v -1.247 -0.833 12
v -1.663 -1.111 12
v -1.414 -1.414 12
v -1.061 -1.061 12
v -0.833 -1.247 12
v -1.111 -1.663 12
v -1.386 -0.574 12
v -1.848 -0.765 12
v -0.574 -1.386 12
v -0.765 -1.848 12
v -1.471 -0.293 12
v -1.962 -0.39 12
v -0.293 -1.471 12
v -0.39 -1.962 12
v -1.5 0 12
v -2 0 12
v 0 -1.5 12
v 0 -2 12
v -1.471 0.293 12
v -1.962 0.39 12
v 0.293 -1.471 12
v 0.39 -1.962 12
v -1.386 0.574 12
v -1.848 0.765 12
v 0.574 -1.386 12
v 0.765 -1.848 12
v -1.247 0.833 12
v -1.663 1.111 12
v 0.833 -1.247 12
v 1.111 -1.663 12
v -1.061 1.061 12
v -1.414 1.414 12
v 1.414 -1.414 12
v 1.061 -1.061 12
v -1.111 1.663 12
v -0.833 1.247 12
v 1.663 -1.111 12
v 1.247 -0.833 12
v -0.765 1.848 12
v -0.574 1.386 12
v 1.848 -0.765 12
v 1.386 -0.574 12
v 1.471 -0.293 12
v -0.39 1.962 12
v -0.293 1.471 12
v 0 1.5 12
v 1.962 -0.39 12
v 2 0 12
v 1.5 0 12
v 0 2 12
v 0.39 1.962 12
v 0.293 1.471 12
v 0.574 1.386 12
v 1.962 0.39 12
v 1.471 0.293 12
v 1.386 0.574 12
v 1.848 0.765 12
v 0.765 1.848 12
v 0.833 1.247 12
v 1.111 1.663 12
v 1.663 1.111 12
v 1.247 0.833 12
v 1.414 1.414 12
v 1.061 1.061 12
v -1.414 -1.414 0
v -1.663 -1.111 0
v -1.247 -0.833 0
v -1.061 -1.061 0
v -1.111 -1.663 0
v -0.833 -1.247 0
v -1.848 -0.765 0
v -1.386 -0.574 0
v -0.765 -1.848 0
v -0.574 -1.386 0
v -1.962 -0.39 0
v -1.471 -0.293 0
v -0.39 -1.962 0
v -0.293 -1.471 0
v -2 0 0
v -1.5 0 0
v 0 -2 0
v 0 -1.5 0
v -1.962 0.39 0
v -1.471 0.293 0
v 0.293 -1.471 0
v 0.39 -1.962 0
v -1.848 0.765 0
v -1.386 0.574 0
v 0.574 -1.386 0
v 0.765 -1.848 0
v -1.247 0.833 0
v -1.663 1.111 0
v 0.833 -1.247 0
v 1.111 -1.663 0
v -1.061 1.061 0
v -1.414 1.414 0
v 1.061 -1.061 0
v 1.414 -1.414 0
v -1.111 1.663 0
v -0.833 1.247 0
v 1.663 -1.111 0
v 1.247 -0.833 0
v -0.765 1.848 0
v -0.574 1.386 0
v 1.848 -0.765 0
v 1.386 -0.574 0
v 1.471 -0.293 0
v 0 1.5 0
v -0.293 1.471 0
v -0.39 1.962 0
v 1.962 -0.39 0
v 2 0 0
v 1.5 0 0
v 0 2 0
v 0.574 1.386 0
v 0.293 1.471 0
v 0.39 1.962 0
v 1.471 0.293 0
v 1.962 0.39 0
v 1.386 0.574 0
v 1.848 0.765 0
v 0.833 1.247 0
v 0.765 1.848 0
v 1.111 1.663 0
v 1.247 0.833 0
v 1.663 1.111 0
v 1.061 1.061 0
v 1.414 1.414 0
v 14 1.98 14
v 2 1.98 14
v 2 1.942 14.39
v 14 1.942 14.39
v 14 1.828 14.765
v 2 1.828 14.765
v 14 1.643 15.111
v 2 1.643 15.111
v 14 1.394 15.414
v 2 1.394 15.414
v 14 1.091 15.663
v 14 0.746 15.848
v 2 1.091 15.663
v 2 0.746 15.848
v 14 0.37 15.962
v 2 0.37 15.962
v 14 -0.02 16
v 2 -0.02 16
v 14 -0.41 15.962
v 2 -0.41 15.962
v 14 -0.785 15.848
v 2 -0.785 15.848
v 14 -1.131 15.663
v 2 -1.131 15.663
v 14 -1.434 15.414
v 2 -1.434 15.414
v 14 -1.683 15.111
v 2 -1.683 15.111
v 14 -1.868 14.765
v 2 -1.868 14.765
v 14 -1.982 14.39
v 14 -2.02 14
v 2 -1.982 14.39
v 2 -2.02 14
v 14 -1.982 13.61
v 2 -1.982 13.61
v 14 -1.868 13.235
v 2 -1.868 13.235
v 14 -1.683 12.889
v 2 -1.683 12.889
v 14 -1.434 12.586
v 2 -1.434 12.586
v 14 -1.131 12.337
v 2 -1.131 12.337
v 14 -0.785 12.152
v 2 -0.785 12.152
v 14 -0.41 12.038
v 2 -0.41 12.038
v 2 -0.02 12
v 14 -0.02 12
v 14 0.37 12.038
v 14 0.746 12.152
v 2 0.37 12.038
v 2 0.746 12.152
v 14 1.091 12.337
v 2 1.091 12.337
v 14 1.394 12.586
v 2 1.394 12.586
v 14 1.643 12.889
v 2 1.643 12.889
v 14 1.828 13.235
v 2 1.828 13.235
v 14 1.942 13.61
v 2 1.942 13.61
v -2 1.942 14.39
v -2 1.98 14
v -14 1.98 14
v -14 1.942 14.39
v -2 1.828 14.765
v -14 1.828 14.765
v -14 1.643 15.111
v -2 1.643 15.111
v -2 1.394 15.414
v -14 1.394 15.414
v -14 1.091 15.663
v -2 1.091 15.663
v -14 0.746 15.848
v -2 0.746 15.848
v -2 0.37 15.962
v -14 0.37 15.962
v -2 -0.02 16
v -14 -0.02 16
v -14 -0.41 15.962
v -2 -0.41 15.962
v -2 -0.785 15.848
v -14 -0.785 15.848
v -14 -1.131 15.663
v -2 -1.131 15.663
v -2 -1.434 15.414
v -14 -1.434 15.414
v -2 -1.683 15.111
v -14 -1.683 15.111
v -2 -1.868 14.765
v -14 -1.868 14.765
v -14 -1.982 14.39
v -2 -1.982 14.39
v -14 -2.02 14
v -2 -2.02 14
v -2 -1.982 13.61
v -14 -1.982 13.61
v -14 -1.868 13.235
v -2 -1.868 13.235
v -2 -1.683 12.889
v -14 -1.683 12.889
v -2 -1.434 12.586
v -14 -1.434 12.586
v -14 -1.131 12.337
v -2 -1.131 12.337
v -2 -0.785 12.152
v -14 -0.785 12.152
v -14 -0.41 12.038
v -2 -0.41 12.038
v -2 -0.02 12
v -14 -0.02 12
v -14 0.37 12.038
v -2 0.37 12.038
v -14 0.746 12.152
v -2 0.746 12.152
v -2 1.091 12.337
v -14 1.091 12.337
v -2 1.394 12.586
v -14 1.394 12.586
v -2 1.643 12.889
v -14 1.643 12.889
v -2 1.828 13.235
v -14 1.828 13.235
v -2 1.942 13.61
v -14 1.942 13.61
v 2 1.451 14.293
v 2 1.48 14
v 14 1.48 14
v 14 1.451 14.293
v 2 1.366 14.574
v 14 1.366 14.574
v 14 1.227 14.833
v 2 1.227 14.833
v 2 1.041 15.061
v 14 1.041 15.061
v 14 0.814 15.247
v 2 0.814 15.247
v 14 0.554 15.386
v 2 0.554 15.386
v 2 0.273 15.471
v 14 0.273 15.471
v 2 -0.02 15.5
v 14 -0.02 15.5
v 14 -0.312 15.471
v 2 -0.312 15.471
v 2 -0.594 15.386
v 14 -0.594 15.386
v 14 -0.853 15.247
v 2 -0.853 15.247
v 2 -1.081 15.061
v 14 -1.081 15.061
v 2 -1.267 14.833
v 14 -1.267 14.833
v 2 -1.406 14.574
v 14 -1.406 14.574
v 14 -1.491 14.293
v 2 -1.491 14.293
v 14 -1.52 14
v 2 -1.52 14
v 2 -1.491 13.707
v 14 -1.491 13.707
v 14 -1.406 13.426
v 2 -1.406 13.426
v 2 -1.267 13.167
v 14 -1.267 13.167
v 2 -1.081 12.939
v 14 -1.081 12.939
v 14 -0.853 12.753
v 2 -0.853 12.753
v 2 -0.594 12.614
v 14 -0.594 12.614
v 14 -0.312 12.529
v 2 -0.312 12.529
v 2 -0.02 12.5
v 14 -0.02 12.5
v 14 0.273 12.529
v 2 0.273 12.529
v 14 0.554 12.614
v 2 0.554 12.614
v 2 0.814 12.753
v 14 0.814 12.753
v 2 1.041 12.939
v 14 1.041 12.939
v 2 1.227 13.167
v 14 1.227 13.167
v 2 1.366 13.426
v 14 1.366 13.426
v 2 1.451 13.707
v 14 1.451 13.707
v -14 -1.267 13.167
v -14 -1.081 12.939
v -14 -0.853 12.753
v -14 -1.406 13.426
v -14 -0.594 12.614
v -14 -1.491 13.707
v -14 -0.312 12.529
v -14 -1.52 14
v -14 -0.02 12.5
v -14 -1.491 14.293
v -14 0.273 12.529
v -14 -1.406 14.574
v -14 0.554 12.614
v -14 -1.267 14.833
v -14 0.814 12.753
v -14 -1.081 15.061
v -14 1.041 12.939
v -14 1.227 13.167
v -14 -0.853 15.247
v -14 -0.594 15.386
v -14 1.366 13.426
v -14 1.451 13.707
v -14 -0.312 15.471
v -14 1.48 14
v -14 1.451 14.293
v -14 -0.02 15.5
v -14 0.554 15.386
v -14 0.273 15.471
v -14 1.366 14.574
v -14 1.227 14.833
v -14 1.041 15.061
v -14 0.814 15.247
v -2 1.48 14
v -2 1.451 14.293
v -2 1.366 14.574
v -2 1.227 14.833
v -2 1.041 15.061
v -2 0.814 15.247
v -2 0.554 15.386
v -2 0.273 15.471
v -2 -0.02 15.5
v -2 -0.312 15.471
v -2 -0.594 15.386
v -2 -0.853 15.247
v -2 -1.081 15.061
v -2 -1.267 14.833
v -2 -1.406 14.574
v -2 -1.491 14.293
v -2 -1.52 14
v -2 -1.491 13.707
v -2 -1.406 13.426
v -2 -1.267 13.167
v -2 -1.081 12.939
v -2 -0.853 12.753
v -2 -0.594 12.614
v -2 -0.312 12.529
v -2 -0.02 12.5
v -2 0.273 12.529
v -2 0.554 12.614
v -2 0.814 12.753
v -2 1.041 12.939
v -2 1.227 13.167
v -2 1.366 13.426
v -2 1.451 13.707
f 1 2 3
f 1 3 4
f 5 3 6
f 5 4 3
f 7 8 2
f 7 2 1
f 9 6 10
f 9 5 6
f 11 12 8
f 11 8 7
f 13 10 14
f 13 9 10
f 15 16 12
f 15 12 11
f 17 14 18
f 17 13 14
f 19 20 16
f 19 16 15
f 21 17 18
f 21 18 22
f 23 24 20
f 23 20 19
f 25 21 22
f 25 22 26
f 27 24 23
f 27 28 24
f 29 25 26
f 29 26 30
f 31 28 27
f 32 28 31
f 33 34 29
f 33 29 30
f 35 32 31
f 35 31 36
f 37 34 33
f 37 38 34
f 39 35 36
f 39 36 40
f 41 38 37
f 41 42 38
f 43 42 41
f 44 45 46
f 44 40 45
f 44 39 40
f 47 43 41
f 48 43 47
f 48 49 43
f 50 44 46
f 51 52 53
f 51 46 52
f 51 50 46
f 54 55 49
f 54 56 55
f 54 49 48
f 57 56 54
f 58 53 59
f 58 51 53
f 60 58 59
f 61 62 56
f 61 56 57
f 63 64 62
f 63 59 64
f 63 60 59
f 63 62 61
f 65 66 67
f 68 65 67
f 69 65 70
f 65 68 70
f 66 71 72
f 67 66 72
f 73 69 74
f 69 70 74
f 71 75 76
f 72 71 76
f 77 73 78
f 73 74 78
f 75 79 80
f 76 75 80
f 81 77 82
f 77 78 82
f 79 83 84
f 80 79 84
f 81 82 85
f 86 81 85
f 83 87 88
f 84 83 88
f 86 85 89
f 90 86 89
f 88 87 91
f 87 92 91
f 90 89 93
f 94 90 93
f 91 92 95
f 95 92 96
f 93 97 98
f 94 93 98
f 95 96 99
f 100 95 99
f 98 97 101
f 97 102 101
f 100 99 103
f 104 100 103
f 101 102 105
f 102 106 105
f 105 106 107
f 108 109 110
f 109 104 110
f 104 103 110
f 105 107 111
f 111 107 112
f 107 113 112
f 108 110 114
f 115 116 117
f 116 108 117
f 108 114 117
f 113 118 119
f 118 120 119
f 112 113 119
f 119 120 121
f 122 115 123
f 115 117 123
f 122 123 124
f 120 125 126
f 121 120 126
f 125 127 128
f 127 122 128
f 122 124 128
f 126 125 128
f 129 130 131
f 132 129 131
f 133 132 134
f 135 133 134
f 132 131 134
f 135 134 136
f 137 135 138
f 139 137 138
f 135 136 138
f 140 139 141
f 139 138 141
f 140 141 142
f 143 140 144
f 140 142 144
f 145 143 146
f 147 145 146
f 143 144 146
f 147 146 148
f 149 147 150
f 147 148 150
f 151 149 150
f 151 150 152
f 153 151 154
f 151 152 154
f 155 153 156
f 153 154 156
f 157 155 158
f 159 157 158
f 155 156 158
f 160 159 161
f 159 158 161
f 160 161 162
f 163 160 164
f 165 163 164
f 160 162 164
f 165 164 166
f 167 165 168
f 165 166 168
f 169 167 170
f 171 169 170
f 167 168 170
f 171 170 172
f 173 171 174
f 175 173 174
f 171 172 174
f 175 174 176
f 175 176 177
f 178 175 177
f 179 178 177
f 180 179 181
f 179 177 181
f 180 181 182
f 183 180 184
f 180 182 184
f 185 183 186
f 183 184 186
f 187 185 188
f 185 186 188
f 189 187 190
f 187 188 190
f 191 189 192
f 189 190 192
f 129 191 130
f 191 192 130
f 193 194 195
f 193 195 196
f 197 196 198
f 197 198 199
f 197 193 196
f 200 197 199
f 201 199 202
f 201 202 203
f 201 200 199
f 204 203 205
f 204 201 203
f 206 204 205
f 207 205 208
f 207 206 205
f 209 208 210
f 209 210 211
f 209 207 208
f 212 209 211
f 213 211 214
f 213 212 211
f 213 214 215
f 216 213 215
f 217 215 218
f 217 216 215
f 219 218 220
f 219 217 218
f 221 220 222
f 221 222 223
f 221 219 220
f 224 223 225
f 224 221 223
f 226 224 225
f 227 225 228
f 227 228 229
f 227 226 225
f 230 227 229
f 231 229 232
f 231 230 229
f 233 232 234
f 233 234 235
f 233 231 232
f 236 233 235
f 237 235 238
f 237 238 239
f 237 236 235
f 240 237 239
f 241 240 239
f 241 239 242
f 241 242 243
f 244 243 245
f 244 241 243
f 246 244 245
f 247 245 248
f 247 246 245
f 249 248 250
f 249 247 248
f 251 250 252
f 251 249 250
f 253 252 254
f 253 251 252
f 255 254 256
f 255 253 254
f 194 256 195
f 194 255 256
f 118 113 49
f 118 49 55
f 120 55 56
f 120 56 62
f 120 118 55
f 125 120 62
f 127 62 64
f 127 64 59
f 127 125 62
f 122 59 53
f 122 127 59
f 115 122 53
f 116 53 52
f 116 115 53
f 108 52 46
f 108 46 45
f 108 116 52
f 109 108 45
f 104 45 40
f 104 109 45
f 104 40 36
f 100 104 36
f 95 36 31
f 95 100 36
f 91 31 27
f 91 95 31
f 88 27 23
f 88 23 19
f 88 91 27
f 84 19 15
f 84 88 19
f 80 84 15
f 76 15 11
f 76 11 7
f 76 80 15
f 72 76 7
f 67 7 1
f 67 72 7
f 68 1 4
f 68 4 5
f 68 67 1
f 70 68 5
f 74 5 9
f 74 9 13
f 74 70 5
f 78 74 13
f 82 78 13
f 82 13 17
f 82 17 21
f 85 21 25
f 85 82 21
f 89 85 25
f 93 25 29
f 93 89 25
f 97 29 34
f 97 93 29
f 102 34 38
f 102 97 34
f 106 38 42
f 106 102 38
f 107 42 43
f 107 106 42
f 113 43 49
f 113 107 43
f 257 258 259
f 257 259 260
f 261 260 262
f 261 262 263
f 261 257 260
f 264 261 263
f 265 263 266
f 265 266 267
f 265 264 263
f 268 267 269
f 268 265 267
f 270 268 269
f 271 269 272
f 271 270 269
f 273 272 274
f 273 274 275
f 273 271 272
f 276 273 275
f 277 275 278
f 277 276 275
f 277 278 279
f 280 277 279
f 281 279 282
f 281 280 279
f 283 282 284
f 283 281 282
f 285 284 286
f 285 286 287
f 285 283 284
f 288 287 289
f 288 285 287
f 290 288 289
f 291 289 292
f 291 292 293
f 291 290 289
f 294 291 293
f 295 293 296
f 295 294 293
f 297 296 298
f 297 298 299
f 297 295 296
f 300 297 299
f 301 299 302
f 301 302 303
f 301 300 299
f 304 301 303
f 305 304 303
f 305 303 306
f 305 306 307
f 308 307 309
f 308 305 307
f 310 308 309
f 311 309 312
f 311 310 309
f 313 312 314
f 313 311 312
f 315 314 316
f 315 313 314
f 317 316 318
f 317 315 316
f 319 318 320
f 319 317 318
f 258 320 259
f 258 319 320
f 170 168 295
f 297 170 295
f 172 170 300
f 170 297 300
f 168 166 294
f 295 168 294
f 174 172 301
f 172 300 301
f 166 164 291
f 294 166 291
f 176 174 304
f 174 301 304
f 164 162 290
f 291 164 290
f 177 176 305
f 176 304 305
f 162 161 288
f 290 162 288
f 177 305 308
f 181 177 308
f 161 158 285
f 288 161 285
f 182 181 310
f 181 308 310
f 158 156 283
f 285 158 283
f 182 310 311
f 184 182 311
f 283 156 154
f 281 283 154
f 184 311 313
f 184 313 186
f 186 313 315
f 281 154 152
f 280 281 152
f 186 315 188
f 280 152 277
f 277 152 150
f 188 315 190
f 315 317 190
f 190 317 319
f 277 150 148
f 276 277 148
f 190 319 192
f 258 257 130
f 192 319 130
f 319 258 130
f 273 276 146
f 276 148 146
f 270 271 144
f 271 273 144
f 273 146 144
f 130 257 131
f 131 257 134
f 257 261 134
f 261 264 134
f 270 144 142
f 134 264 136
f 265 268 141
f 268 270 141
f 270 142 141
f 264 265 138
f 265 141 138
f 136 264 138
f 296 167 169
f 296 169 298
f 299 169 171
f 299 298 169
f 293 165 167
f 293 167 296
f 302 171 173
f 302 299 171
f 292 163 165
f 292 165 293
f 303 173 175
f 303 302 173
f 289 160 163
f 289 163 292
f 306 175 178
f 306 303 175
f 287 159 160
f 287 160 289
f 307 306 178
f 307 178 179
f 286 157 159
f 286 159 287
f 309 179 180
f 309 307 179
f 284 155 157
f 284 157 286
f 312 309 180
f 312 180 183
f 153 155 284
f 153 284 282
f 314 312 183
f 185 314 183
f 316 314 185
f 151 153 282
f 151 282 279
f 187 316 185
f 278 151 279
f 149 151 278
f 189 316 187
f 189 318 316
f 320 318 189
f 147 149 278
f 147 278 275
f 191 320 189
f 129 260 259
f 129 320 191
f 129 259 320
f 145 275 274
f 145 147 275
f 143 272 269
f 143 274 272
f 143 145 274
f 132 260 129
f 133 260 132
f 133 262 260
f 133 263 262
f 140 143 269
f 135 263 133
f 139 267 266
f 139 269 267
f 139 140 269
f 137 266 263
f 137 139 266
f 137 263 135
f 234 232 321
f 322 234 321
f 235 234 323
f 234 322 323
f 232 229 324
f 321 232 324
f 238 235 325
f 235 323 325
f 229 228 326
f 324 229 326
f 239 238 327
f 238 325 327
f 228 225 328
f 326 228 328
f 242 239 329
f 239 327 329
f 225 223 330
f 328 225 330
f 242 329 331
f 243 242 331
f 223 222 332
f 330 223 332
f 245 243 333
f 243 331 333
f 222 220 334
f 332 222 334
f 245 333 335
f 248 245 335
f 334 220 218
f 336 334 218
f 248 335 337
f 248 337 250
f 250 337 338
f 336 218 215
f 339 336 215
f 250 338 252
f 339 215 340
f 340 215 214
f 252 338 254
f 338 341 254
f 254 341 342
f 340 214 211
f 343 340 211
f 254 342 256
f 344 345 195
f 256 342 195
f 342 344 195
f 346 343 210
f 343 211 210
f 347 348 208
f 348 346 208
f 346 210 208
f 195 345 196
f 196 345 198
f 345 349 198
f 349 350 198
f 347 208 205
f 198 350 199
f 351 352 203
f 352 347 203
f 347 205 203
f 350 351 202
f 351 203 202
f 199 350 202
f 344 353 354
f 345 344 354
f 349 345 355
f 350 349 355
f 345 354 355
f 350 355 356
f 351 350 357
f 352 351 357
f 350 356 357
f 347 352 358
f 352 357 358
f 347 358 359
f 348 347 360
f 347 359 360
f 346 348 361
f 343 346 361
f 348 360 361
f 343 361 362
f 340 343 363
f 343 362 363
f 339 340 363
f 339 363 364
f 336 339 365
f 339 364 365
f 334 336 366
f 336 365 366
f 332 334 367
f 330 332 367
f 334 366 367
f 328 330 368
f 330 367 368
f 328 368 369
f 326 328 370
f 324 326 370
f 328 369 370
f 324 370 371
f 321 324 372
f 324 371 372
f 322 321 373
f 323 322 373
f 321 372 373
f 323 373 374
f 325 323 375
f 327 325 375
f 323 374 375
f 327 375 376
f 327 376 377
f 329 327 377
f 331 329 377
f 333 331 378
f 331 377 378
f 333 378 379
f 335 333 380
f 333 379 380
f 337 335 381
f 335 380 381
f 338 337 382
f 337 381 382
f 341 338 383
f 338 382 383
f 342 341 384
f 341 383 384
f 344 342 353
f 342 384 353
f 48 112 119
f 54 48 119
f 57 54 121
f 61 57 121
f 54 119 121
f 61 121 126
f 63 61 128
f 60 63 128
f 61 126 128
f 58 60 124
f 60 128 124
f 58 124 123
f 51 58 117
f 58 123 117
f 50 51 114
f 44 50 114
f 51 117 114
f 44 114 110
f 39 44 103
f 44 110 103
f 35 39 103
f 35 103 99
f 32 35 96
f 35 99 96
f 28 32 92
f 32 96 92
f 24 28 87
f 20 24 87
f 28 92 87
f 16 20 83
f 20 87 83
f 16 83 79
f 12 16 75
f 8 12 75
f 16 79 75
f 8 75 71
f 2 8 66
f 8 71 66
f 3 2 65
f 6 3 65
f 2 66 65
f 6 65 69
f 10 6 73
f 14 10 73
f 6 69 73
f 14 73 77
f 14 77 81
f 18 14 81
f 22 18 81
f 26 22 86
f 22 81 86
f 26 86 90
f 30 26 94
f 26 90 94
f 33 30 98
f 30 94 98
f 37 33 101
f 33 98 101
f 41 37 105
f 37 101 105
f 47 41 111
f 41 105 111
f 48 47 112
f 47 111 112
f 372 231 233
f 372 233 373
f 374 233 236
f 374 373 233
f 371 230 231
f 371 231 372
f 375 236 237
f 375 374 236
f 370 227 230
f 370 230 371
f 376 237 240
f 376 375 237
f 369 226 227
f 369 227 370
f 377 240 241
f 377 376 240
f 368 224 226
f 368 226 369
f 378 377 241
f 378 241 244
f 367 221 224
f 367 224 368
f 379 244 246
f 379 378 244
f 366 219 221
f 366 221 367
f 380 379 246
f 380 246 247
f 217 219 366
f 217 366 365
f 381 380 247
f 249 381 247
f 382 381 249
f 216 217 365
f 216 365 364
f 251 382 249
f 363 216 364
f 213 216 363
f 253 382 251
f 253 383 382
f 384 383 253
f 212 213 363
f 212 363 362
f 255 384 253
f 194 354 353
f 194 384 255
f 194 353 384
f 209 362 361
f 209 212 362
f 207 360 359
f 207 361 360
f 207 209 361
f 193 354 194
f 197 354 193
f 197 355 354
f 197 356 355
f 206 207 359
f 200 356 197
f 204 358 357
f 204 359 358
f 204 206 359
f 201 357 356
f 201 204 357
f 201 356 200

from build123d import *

# Parameters (mm, degrees)
F0_R     = 2
F0_R_2   = 1.5
F1_DEPTH = 12
F3_START = 2
F2_R     = 2.0000985341
F2_R_2   = 1.5
F3_DEPTH = 12
F4_START = -2
F4_DEPTH = 12


with BuildPart() as f1:
    # F0 (on Top) → F1 (new body)
    with BuildSketch(Plane.XY):
        Circle(F0_R)
        Circle(F0_R_2, mode=Mode.SUBTRACT)
    extrude(amount=F1_DEPTH)


with BuildPart() as f3:
    # F2 (on Right) → F3 (new body)
    with BuildSketch(Plane.YZ.offset(F3_START)):
        with Locations((-0.0198531127, 14)):
            Circle(F2_R)
        with Locations((-0.0198531127, 14)):
            Circle(F2_R_2, mode=Mode.SUBTRACT)
    extrude(amount=F3_DEPTH)


with BuildPart() as f4:
    # F2 (on Right) → F4 (new body)
    with BuildSketch(Plane.YZ.offset(F4_START)):
        with Locations((-0.0198531127, 14)):
            Circle(F2_R)
        with Locations((-0.0198531127, 14)):
            Circle(F2_R_2, mode=Mode.SUBTRACT)
    extrude(amount=-F4_DEPTH)


solid = Compound([f1.part, f3.part, f4.part])
